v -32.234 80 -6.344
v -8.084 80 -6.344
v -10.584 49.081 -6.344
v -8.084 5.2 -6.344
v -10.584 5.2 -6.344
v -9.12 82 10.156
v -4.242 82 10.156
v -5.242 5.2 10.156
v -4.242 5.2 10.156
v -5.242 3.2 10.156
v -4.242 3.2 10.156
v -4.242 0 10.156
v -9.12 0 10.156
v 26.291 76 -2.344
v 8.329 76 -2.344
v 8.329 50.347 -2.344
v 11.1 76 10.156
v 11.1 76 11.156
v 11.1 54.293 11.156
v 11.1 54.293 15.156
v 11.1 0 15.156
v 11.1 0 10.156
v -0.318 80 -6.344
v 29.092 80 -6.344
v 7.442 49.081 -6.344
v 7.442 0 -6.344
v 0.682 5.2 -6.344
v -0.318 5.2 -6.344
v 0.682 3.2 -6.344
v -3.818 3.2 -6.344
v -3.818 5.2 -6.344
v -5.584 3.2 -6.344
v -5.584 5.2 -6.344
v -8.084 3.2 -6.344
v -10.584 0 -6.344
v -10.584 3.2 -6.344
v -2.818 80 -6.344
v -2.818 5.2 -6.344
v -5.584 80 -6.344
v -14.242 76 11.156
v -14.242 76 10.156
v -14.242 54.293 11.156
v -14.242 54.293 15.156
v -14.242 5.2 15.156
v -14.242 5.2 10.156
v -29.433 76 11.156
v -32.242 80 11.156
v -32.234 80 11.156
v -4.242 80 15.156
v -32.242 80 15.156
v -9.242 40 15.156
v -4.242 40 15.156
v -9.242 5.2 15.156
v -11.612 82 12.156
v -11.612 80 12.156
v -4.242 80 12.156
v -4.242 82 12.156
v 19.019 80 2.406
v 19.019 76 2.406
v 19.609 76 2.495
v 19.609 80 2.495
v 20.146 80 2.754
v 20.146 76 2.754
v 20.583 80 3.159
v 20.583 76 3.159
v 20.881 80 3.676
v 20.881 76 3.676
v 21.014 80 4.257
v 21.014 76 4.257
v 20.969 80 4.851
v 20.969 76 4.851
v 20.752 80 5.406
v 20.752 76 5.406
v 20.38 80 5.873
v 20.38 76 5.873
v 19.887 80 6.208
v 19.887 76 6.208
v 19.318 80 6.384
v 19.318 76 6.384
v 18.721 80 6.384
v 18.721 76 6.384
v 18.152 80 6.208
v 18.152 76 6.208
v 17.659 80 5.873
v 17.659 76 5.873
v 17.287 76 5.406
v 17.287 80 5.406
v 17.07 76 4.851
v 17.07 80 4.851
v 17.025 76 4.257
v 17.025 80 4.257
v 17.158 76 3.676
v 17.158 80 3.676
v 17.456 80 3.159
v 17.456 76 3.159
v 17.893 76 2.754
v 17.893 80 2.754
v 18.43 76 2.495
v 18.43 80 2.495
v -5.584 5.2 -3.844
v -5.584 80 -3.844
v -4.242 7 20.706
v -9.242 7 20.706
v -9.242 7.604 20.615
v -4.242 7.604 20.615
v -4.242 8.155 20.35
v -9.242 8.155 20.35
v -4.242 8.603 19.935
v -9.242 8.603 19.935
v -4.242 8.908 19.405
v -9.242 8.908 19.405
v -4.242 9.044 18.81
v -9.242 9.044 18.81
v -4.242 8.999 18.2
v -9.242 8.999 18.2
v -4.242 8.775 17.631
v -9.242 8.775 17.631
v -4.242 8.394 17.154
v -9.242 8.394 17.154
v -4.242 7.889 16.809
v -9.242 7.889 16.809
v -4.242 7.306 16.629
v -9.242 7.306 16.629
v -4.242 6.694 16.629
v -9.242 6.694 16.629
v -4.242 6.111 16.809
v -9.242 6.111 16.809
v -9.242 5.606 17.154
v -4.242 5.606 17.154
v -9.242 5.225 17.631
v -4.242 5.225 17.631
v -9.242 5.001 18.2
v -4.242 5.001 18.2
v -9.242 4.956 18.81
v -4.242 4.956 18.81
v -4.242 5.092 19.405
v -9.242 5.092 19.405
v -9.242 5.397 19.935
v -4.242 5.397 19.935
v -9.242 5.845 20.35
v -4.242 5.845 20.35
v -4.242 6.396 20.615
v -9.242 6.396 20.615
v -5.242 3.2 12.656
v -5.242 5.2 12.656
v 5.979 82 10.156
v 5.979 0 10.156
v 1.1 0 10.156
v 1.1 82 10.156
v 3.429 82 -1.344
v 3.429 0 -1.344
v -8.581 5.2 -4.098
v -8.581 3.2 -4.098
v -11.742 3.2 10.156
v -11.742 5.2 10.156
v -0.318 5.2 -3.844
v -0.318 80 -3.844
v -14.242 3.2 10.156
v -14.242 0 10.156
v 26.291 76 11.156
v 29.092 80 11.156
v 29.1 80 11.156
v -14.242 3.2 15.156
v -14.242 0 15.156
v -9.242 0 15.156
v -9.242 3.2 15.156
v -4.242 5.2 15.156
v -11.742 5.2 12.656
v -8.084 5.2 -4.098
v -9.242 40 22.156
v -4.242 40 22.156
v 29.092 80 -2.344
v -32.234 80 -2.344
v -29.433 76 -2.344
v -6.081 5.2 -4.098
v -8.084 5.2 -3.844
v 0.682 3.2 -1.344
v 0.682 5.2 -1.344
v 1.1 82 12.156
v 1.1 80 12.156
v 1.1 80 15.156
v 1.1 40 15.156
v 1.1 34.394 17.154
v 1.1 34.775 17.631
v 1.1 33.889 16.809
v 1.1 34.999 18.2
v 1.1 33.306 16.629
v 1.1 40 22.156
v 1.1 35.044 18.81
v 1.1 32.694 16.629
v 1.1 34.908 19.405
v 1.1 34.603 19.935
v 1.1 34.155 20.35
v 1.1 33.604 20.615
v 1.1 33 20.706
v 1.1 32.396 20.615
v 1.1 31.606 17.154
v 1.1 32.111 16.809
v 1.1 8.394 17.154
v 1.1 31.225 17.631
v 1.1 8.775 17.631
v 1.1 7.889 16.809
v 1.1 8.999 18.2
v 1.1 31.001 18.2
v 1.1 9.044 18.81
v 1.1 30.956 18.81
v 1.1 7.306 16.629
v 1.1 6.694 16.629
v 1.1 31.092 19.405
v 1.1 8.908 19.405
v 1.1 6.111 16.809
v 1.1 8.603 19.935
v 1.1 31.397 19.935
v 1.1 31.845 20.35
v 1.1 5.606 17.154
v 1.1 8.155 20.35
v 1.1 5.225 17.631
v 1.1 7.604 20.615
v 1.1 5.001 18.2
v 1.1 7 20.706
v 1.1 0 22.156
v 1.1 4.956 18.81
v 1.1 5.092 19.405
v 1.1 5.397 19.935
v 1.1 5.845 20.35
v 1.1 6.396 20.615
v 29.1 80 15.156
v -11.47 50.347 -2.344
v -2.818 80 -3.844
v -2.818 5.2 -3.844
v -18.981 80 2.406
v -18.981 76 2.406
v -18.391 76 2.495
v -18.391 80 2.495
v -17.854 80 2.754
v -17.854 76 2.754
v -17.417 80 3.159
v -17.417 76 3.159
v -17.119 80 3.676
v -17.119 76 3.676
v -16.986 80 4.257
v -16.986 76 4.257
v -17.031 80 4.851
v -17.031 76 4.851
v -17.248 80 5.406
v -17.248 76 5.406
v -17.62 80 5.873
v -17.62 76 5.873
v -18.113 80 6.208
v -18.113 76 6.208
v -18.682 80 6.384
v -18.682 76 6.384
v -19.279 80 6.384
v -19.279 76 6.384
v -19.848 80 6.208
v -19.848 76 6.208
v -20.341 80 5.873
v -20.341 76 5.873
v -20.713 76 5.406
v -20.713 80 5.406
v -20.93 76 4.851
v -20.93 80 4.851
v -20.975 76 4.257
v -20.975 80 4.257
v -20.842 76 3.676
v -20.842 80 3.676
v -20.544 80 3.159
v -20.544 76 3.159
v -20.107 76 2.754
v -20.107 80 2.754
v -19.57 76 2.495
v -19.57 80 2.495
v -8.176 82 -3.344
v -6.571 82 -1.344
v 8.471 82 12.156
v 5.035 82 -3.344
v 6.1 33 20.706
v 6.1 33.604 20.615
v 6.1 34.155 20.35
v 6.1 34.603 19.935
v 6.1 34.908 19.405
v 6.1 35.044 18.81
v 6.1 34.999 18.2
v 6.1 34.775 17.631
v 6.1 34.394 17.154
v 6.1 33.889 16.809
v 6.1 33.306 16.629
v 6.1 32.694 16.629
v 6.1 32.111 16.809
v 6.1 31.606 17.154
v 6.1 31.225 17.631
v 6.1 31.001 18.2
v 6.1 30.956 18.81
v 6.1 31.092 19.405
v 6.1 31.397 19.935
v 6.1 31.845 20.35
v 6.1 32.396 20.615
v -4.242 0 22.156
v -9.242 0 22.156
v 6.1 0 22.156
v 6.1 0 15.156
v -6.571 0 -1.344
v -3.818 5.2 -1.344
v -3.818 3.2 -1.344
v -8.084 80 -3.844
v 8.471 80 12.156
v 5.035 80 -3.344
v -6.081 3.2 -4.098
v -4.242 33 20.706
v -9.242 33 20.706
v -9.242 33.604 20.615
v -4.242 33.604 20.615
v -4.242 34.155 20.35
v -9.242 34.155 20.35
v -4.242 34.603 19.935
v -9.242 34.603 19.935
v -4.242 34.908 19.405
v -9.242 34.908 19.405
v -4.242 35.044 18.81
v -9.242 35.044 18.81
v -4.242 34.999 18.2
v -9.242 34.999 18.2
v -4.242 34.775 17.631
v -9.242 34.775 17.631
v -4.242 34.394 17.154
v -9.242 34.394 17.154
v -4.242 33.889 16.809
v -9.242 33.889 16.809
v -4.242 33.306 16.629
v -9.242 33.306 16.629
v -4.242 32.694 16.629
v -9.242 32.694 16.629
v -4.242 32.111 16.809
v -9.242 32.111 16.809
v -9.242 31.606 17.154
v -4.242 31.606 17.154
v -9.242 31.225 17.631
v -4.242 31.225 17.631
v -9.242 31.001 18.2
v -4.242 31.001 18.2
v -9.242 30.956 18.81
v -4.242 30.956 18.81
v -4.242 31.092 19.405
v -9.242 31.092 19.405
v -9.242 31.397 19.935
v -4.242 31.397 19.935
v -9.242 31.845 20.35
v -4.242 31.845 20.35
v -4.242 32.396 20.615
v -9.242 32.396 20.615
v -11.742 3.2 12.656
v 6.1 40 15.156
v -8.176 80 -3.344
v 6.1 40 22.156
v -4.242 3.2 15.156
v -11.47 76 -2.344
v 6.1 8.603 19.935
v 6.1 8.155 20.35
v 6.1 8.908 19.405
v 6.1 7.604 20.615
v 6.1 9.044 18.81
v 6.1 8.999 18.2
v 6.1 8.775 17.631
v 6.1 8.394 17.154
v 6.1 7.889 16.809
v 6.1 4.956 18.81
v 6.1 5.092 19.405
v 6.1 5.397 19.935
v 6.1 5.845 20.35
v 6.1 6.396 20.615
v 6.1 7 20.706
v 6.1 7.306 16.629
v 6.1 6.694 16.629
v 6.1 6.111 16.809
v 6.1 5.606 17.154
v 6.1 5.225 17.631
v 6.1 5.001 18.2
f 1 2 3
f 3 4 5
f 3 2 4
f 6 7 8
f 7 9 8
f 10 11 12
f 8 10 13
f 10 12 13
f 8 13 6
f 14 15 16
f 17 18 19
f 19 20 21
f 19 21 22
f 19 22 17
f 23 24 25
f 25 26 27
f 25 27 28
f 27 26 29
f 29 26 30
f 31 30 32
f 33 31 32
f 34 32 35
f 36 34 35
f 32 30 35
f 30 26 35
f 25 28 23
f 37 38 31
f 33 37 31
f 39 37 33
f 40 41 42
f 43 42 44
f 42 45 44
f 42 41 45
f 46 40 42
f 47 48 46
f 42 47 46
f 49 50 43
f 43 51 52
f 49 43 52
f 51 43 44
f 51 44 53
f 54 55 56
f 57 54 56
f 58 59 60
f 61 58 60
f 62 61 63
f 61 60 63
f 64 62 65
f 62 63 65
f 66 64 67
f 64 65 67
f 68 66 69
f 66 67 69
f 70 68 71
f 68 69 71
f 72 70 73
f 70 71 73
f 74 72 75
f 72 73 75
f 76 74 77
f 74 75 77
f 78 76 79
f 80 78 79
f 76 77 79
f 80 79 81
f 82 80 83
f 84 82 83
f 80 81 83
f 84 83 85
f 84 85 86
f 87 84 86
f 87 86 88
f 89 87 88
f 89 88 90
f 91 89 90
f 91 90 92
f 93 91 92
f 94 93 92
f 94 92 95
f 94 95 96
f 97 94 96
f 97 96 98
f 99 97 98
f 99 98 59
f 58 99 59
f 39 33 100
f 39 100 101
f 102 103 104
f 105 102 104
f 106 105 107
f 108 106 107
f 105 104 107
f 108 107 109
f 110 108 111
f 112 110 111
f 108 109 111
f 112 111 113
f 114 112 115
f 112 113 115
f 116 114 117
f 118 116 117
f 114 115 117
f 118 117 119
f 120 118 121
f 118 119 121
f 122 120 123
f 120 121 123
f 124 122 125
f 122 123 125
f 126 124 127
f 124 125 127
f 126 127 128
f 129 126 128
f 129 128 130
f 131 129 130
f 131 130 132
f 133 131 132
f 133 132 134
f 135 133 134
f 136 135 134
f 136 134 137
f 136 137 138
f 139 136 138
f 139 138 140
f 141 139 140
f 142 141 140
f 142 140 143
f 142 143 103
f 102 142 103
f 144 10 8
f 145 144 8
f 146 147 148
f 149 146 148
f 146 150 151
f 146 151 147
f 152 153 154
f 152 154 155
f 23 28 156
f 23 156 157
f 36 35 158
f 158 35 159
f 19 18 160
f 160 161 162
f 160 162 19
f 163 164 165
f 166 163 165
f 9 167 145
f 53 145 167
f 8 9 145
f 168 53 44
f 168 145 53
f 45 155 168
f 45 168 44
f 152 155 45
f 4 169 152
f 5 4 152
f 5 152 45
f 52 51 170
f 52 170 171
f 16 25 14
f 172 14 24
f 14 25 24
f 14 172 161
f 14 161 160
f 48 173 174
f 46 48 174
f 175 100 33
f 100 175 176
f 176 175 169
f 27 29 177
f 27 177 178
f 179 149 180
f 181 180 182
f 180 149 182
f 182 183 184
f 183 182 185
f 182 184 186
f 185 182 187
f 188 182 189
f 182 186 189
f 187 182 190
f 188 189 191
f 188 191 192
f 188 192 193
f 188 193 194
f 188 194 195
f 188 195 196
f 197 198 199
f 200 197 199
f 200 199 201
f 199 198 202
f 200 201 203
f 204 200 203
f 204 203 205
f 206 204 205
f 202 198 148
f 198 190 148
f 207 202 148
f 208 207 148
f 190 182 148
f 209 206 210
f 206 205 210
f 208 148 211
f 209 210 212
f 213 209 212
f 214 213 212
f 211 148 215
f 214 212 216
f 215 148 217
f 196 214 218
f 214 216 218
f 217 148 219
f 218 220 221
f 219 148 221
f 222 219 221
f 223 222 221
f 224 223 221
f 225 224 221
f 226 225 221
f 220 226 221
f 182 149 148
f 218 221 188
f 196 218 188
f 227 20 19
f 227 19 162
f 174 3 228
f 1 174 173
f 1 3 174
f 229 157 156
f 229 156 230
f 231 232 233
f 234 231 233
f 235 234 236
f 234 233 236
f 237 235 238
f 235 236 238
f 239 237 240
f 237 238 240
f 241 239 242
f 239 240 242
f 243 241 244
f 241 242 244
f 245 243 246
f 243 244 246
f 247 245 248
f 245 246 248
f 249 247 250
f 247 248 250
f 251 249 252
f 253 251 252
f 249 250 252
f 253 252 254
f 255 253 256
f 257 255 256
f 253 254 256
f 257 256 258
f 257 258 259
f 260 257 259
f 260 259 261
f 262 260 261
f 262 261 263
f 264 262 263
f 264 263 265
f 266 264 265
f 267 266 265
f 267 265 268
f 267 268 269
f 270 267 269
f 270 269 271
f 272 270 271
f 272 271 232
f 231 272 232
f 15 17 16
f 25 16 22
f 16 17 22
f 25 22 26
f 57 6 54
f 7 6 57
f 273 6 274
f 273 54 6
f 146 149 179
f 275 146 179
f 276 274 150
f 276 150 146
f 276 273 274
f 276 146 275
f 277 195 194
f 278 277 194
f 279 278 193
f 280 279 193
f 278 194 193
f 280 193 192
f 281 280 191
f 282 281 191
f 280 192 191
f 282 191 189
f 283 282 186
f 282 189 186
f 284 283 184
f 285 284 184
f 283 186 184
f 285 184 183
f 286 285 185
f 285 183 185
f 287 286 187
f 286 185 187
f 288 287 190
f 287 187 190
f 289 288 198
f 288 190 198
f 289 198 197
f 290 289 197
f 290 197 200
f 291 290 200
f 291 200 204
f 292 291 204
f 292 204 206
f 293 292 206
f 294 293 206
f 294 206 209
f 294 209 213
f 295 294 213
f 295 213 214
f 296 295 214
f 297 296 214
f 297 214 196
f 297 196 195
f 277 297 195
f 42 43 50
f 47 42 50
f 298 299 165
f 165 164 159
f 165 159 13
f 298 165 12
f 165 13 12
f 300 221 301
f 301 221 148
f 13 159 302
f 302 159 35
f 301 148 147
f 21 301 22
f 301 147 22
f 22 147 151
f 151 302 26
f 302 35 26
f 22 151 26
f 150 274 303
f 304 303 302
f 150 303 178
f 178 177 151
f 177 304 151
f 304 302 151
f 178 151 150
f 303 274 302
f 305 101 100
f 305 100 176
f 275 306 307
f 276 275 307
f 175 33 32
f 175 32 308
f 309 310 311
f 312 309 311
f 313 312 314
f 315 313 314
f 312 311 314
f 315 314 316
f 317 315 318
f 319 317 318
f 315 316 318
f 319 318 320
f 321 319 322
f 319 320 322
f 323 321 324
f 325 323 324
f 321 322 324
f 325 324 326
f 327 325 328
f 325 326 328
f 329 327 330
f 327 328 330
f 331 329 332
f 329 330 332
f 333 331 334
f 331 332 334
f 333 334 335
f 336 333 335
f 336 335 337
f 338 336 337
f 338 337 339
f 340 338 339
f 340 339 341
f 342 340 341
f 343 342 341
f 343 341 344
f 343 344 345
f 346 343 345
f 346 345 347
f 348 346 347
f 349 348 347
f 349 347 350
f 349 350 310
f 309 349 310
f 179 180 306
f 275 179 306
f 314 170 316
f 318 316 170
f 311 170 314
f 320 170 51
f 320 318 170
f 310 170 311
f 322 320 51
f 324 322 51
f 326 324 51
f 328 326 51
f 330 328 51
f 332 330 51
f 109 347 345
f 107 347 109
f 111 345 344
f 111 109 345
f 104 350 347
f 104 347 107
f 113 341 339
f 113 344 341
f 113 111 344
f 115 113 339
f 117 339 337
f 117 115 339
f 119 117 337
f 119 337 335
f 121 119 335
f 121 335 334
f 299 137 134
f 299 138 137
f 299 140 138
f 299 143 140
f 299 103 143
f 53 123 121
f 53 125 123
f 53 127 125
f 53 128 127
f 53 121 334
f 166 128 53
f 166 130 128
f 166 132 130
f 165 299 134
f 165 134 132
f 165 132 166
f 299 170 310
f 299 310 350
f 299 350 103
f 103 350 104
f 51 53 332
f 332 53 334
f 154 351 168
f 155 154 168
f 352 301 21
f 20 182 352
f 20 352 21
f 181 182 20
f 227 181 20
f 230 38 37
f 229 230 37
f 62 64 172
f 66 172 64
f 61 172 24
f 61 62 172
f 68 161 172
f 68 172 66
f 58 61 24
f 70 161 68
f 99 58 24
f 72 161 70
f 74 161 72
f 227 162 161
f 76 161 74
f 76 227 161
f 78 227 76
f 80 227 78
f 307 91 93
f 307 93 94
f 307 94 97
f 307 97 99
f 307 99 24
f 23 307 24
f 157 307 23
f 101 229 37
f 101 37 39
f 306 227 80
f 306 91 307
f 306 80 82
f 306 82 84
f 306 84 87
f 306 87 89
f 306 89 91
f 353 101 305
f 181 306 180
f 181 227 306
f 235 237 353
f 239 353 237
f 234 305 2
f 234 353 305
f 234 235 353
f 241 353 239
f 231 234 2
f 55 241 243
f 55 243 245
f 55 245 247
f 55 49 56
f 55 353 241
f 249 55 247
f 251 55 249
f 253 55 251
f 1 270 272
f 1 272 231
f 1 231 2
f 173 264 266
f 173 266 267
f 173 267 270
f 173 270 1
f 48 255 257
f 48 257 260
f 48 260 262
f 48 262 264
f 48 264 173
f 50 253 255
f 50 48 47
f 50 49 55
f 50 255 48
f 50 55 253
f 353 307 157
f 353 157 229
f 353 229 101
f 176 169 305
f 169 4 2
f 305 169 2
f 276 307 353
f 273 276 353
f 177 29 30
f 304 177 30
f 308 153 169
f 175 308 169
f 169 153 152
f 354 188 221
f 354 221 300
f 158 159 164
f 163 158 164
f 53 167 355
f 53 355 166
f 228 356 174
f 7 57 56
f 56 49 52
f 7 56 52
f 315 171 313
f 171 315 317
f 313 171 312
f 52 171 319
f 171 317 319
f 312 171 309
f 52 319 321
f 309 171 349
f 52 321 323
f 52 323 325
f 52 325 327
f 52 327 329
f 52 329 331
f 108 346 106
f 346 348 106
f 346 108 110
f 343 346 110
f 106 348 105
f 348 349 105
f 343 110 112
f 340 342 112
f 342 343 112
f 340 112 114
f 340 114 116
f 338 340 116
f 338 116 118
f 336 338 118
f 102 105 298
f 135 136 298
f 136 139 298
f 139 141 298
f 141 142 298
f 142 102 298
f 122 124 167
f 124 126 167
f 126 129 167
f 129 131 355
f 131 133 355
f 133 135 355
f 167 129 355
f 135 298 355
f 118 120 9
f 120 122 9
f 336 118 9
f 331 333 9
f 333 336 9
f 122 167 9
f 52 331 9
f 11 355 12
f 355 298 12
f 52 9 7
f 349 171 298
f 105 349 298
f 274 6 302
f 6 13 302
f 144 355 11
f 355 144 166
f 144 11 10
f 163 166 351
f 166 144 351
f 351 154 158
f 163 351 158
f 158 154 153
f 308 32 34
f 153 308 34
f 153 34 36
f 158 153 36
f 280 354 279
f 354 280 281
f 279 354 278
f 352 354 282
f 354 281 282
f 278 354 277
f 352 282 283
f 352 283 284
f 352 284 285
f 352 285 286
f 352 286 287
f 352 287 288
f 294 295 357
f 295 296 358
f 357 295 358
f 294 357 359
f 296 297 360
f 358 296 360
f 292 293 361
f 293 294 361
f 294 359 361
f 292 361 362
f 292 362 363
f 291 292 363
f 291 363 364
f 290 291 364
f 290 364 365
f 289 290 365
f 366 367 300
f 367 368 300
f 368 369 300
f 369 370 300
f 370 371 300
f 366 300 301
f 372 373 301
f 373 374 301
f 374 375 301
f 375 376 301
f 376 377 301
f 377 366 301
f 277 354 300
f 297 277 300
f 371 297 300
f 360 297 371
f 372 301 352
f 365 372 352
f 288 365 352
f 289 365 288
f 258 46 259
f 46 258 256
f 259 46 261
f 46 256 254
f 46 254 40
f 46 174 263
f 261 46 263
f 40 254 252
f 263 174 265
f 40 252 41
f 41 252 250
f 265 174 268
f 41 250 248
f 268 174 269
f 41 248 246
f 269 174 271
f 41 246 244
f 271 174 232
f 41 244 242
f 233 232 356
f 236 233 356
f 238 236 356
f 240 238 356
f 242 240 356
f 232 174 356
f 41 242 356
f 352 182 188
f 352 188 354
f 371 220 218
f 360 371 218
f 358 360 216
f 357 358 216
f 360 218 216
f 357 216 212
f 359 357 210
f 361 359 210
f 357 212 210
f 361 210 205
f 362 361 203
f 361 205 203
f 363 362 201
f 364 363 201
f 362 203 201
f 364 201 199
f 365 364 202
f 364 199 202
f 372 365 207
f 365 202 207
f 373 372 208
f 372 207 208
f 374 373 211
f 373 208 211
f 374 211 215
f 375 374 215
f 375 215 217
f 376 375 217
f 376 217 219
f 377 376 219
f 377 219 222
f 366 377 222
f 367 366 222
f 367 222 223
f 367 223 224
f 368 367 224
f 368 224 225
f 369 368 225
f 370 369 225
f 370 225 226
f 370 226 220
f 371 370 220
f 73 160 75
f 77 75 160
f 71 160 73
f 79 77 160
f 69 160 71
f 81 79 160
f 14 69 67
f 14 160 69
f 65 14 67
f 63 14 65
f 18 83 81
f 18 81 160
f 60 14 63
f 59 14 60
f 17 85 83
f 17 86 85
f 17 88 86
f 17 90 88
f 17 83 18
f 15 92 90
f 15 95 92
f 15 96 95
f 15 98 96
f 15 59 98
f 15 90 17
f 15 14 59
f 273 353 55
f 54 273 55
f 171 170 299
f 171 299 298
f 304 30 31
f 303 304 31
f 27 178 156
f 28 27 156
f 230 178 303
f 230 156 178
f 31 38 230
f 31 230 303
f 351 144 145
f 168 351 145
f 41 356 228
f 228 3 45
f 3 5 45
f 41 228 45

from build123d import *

# Parameters (mm, degrees)
SKETCH2_W           = 5
SKETCH2_H           = 7
BOSS_EXTRUDE1_DEPTH = 40
SKETCH3_R           = 2.05
CUT_EXTRUDE2_DEPTH  = 40
BOSS_EXTRUDE2_DEPTH = 40
SKETCH7_W           = 4.5
SKETCH7_H           = 2
CUT_EXTRUDE3_DEPTH  = 87.11081163
SKETCH8_W           = 1
SKETCH8_H           = 2
CUT_EXTRUDE4_DEPTH  = 5
BOSS_EXTRUDE3_DEPTH = 2
SKETCH10_W          = 2.5
SKETCH10_H          = 2
CUT_EXTRUDE5_DEPTH  = 11
BOSS_EXTRUDE4_DEPTH = 4
BOSS_EXTRUDE7_DEPTH = 4
BOSS_EXTRUDE8_DEPTH = 19
SKETCH17_R          = 2
CUT_EXTRUDE7_DEPTH  = 19
SKETCH18_W          = 2.5
SKETCH18_H          = 2
CUT_EXTRUDE8_DEPTH  = 2.5
SKETCH19_W          = 2.5
SKETCH19_H          = 2
CUT_EXTRUDE9_DEPTH  = 19.5
SKETCH20_W          = 2.3
SKETCH20_H          = 2
CUT_EXTRUDE10_DEPTH = 2.5
SKETCH21_W          = 2.5
SKETCH21_H          = 74.8
CUT_EXTRUDE11_DEPTH = 2.5


with BuildPart() as part:
    # Sketch2 → Boss-Extrude1 (new body)
    with BuildSketch(Plane(origin=(0, 0, 0), x_dir=(1, 0, 0), z_dir=(0, 1, 0))):
        Polygon((11.100217707, -10.156419986), (7.442255773, 6.343580014), (7.442255773, 1.343580014), (3.429331515, 1.343580014), (5.978820135, -10.156419986), align=None)
        Polygon((7.442255773, 6.343580014), (-10.583592744, 6.343580014), (-5.702112708, 5.261381945), (-6.570668485, 1.343580014), (3.429331515, 1.343580014), (2.560775738, 5.261381945), align=None)
        Polygon((-10.583592744, 1.343580014), (-10.583592744, 6.343580014), (-14.241554677, -10.156419986), (-9.120157106, -10.156419986), (-6.570668485, 1.343580014), align=None)
        Polygon((7.442255773, 1.343580014), (7.442255773, 6.343580014), (2.560775738, 5.261381945), (3.429331515, 1.343580014), align=None)
        Polygon((-5.702112708, 5.261381945), (-10.583592744, 6.343580014), (-10.583592744, 1.343580014), (-6.570668485, 1.343580014), align=None)
        Polygon((-9.360074642, -11.238618055), (-14.241554677, -10.156419986), (-14.241554677, -15.156419986), (-9.241554677, -15.156419986), (-4.241554677, -15.156419986), (-4.241554677, -10.156419986), (-9.120157106, -10.156419986), align=None)
        Polygon((-9.120157106, -10.156419986), (-14.241554677, -10.156419986), (-9.360074642, -11.238618055), align=None)
        Polygon((6.218737671, -11.238618055), (11.100217707, -10.156419986), (5.978820135, -10.156419986), align=None)
        Polygon((11.100217707, -15.156419986), (11.100217707, -10.156419986), (6.218737671, -11.238618055), (5.978820135, -10.156419986), (1.100217707, -10.156419986), (1.100217707, -15.156419986), (6.100217707, -15.156419986), align=None)
        with Locations((3.600217707, -18.656419986)):
            Rectangle(SKETCH2_W, SKETCH2_H)
        with Locations((-6.741554677, -18.656419986)):
            Rectangle(SKETCH2_W, SKETCH2_H)
    extrude(amount=BOSS_EXTRUDE1_DEPTH)

    # Sketch3 → Cut-Extrude2 (cut)
    with BuildSketch(Plane.ZY.offset(9.241554677)):
        with Locations((18.656419986, 33)):
            Circle(SKETCH3_R)
        with Locations((18.656419986, 7)):
            Circle(SKETCH3_R)
    extrude(amount=-CUT_EXTRUDE2_DEPTH, mode=Mode.SUBTRACT)

    # Sketch4 → Boss-Extrude2 (add)
    with BuildSketch(Plane(origin=(0, 40, 0), x_dir=(1, 0, 0), z_dir=(0, 1, 0))):
        Polygon((-4.241554677, -10.156419986), (-9.120157106, -10.156419986), (-6.570668485, 1.343580014), (3.429331515, 1.343580014), (5.978820135, -10.156419986), (1.100217707, -10.156419986), (1.100217707, -15.156419986), (6.100217707, -15.156419986), (11.100217707, -15.156419986), (11.100217707, -10.156419986), (7.442255773, 6.343580014), (-10.583592744, 6.343580014), (-14.241554677, -10.156419986), (-14.241554677, -15.156419986), (-9.241554677, -15.156419986), (-4.241554677, -15.156419986), align=None)
    extrude(amount=BOSS_EXTRUDE2_DEPTH)

    # Sketch7 → Cut-Extrude3 (cut, through all)
    with BuildSketch(Plane(origin=(0, 0, -6.343580014), x_dir=(-1, 0, 0), z_dir=(0, 0, -1))):
        with Locations((1.567744227, 4.2)):
            Rectangle(SKETCH7_W, SKETCH7_H)
    extrude(amount=-CUT_EXTRUDE3_DEPTH, mode=Mode.SUBTRACT)

    # Sketch8 → Cut-Extrude4 (cut)
    with BuildSketch(Plane(origin=(0, 0, 10.156419986), x_dir=(-1, 0, 0), z_dir=(0, 0, -1))):
        with Locations((4.741554677, 4.2)):
            Rectangle(SKETCH8_W, SKETCH8_H)
    extrude(amount=-CUT_EXTRUDE4_DEPTH, mode=Mode.SUBTRACT)

    # Sketch9 → Boss-Extrude3 (add)
    with BuildSketch(Plane(origin=(0, 80, 0), x_dir=(1, 0, 0), z_dir=(0, 1, 0))):
        Polygon((1.100217707, -10.156419986), (1.100217707, -12.156419986), (8.470768489, -12.156419986), (5.034501218, 3.343580014), (-8.175838189, 3.343580014), (-11.61210546, -12.156419986), (-4.241554677, -12.156419986), (-4.241554677, -10.156419986), (-9.120157106, -10.156419986), (-6.570668485, 1.343580014), (3.429331515, 1.343580014), (5.978820135, -10.156419986), align=None)
    extrude(amount=BOSS_EXTRUDE3_DEPTH)

    # Sketch10 → Cut-Extrude5 (cut)
    with BuildSketch(Plane(origin=(-5.241554677, 0, 0), x_dir=(0, 0, -1), z_dir=(1, 0, 0))):
        with Locations((-13.906419986, 4.2)):
            Rectangle(SKETCH10_W, SKETCH10_H)
    extrude(amount=-CUT_EXTRUDE5_DEPTH, mode=Mode.SUBTRACT)

    # Sketch11 → Boss-Extrude4 (add)
    with BuildSketch(Plane.XY.offset(15.156419986)):
        Polygon((11.100217707, 54.293335879), (29.100217707, 80), (11.100217707, 80), align=None)
        Polygon((-14.241554677, 54.293335879), (-32.241554677, 80), (-14.241554677, 80), align=None)
    extrude(amount=-BOSS_EXTRUDE4_DEPTH)

    # Sketch15 → Boss-Extrude7 (add)
    with BuildSketch(Plane(origin=(0, 0, -6.343580014), x_dir=(-1, 0, 0), z_dir=(0, 0, -1))):
        Polygon((-7.442255773, 80), (-7.442255773, 49.080595654), (-29.092255773, 80), align=None)
        Polygon((10.583592744, 80), (10.583592744, 49.080595654), (32.233592744, 80), align=None)
    extrude(amount=-BOSS_EXTRUDE7_DEPTH)

    # Sketch16 → Boss-Extrude8 (add)
    with BuildSketch(Plane(origin=(0, 0, -6.343580014), x_dir=(-1, 0, 0), z_dir=(0, 0, -1))):
        Polygon((32.233592744, 80), (29.432762591, 76), (10.233592744, 76), (10.233592744, 80), align=None)
        Polygon((-29.092255773, 80), (-26.29142562, 76), (-7.092255773, 76), (-7.092255773, 80), align=None)
    extrude(amount=-BOSS_EXTRUDE8_DEPTH)

    # Sketch17 → Cut-Extrude7 (cut)
    with BuildSketch(Plane(origin=(0, 76, 0), x_dir=(-1, 0, 0), z_dir=(0, -1, 0))):
        with Locations(Location((-19.01946661, -4.406419986, 0), (0, 0, 90))):
            Circle(SKETCH17_R)
        with Locations(Location((18.980533391, -4.406419986, 0), (0, 0, 90))):
            Circle(SKETCH17_R)
    extrude(amount=-CUT_EXTRUDE7_DEPTH, mode=Mode.SUBTRACT)

    # Sketch18 → Cut-Extrude8 (cut)
    with BuildSketch(Plane.XY.offset(12.656419986)):
        with Locations((-12.991554677, 4.2)):
            Rectangle(SKETCH18_W, SKETCH18_H)
    extrude(amount=-CUT_EXTRUDE8_DEPTH, mode=Mode.SUBTRACT)

    # Sketch19 → Cut-Extrude9 (cut, along a direction that is not the sketch's normal)
    with BuildSketch(Plane.XY.offset(10.156419986)):
        with Locations((-12.991554677, 4.2)):
            Rectangle(SKETCH19_W, SKETCH19_H)
    extrude(amount=-CUT_EXTRUDE9_DEPTH, dir=(-0.2164396139381068, 0, 0.9762960071199325), mode=Mode.SUBTRACT)

    # Sketch20 → Cut-Extrude10 (cut, along a direction that is not the sketch's normal)
    with BuildSketch(Plane(origin=(-9.045364277, 0, -2.005308982), x_dir=(-0.2164396139381068, 0, 0.9762960071199326), z_dir=(-0.9762960071199326, 0, -0.2164396139381068))):
        with Locations((-3.293602146, 4.2)):
            Rectangle(SKETCH20_W, SKETCH20_H)
    extrude(amount=-CUT_EXTRUDE10_DEPTH, dir=(-1, 0, 0), mode=Mode.SUBTRACT)

    # Sketch21 → Cut-Extrude11 (cut)
    with BuildSketch(Plane(origin=(0, 0, -6.343580014), x_dir=(-1, 0, 0), z_dir=(0, 0, -1))):
        with Locations((1.567744227, 42.6)):
            Rectangle(SKETCH21_W, SKETCH21_H)
        with Locations((6.833592744, 42.6)):
            Rectangle(SKETCH21_W, SKETCH21_H)
    extrude(amount=-CUT_EXTRUDE11_DEPTH, mode=Mode.SUBTRACT)


solid = part.part
